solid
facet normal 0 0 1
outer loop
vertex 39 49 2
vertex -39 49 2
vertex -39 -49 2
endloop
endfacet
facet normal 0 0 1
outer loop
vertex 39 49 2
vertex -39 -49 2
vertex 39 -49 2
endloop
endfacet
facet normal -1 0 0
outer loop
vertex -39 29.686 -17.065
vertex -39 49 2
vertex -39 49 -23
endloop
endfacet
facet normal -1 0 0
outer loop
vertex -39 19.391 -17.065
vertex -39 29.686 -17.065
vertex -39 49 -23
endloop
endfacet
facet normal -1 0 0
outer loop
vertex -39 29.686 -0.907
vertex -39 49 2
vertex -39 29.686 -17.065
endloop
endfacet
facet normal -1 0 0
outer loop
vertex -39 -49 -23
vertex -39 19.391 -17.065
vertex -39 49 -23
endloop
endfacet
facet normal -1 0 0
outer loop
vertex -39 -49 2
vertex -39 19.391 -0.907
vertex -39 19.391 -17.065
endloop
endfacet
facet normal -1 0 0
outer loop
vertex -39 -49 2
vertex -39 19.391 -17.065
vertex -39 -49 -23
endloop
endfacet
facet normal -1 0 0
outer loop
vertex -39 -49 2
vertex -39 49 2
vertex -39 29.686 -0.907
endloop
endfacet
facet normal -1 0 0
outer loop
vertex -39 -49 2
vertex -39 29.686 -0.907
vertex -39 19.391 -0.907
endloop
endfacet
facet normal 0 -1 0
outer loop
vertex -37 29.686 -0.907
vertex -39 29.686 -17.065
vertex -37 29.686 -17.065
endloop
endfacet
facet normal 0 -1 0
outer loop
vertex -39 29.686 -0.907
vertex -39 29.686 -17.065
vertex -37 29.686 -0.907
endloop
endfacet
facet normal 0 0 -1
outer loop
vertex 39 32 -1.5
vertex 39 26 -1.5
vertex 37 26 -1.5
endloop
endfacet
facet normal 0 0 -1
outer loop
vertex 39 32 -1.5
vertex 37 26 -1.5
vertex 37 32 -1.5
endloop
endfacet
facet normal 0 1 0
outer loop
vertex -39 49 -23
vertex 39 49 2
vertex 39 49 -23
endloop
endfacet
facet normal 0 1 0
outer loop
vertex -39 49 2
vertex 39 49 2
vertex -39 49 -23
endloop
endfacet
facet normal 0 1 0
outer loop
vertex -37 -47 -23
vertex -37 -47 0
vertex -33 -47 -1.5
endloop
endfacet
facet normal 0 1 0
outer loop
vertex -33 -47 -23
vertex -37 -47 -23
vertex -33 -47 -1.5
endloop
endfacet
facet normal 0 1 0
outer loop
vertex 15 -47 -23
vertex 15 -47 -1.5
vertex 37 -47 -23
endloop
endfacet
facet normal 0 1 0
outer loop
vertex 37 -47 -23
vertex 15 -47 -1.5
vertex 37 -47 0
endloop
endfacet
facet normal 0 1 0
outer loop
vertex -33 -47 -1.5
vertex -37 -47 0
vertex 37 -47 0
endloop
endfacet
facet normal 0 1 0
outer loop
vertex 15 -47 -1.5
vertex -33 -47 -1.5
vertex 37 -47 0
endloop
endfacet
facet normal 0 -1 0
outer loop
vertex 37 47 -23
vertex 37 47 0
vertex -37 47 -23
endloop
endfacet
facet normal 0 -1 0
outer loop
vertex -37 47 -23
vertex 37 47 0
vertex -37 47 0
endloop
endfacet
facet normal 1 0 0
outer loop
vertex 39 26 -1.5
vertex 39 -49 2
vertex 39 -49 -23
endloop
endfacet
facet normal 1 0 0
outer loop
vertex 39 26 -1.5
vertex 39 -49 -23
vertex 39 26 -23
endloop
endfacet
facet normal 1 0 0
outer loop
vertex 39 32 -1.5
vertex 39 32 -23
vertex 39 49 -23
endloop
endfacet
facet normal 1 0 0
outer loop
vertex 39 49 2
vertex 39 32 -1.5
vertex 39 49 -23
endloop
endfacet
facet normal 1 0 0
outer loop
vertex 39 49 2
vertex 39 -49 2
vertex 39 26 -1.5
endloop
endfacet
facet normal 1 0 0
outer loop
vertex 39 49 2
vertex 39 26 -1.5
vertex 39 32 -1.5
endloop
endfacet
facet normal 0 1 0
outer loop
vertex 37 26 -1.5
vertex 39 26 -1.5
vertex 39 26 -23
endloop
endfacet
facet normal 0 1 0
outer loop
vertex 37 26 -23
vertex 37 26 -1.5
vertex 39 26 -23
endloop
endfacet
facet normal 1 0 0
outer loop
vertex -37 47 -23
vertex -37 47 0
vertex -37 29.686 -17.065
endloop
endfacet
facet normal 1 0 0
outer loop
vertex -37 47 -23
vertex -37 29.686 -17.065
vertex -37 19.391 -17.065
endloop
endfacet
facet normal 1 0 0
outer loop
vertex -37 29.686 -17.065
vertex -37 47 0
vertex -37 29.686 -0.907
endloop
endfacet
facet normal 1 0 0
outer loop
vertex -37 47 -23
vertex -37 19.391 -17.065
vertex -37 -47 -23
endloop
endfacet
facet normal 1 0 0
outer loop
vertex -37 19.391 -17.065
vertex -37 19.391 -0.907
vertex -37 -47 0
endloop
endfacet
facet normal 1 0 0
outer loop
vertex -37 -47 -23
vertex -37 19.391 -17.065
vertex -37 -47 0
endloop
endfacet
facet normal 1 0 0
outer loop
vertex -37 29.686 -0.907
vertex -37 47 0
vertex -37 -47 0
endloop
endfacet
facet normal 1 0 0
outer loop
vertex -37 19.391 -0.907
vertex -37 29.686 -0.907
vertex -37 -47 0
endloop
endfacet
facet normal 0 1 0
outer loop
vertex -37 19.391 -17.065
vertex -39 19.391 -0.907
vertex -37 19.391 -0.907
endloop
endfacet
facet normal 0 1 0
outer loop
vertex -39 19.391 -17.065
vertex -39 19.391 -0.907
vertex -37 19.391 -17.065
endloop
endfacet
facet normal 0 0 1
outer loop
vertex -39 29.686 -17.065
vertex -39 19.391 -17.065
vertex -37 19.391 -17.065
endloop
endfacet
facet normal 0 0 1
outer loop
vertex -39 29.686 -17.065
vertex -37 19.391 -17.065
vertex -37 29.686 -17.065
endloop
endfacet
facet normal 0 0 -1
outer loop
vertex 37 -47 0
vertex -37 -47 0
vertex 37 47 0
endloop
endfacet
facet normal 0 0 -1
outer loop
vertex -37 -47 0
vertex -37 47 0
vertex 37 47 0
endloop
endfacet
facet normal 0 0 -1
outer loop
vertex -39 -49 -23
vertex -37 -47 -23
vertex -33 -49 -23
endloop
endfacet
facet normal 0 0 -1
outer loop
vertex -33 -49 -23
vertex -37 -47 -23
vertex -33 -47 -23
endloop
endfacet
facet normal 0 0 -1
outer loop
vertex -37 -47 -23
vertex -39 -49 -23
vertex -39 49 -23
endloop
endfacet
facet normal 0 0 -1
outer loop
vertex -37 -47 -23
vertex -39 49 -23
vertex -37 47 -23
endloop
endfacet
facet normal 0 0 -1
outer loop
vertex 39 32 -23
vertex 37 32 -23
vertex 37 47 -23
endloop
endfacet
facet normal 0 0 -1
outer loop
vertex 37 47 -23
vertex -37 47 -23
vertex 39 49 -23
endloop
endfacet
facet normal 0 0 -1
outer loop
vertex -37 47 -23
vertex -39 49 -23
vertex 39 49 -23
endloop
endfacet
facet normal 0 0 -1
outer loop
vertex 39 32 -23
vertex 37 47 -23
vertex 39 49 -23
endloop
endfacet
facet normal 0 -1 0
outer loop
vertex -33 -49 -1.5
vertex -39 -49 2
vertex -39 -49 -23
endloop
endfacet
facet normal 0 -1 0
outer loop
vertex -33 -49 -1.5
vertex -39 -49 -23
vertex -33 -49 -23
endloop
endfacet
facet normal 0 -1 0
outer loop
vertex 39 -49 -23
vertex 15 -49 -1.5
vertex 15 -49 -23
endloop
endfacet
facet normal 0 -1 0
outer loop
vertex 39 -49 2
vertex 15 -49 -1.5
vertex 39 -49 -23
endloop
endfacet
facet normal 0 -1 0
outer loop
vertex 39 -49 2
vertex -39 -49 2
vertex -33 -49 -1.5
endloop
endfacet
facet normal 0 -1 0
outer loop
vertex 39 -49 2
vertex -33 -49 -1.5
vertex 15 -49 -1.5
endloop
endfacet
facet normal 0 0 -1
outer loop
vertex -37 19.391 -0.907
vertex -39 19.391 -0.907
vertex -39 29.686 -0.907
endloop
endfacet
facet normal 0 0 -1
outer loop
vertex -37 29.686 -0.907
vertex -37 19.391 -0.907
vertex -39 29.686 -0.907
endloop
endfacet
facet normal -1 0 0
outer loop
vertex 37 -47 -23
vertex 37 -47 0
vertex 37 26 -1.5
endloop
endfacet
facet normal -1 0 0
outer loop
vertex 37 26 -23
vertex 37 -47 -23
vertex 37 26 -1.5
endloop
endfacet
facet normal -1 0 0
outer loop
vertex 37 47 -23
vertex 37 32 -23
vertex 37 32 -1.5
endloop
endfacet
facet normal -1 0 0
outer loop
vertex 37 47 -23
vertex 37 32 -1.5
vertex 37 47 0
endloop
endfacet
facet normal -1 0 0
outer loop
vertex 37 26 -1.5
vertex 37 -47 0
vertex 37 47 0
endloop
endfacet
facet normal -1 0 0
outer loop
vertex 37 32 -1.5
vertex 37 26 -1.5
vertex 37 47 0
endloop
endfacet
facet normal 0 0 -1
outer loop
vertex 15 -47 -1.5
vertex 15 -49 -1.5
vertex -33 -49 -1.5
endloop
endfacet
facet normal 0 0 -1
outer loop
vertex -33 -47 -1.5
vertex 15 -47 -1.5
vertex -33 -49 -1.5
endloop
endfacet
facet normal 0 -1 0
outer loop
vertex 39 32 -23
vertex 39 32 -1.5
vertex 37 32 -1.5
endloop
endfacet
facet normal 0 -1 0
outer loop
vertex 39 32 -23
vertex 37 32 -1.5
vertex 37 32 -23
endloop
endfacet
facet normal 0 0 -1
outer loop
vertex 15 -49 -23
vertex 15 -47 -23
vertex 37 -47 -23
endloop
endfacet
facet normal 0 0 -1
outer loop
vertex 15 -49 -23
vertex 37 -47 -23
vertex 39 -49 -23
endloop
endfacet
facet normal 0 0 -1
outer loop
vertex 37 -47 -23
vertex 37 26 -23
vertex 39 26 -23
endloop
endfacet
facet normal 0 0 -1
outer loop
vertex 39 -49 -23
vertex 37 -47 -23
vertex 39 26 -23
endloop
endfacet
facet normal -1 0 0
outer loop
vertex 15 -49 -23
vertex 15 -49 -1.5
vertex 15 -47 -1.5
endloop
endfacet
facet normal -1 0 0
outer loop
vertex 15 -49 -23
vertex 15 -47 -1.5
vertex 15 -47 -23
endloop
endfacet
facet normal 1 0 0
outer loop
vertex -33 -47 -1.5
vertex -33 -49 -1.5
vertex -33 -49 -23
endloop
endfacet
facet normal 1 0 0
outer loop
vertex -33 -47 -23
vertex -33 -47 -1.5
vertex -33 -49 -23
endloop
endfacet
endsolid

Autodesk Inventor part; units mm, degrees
ref_plane "YZ Plane" through (0, 0, 0) normal (1, 0, 0) x (0, 1, 0)
ref_plane "XZ Plane" through (0, 0, 0) normal (0, 1, 0) x (-1, 0, 0)
ref_plane "XY Plane" through (0, 0, 0) normal (0, 0, 1) x (1, 0, 0)
sketch "Эскиз1" plane through (0, 0, 0) normal (0, 0, 1) x (1, 0, 0)
  line L0 (-37, -47) -> (37, -47)
  line L1 (37, -47) -> (37, 47)
  line L2 (37, 47) -> (-37, 47)
  line L3 (-37, 47) -> (-37, -47)
  line L4 (-35, -44) -> (-35, 44) projected
  line L5 (34, -45) -> (-34, -45) projected
  line L6 (35, 44) -> (35, -44) projected
  line L7 (-34, 45) -> (34, 45) projected
  point P0 (0, 0)
  dimension "d0" = 2
  dimension "d1" = 2
  dimension "d2" = 2
  dimension "d3" = 2
extrude "Выдавливание1" add sketch "Эскиз1" along normal blind 2
sketch "Эскиз2" plane through (0, 0, 2) normal (0, 0, 1) x (1, 0, 0)
  line L0 (-39, -49) -> (39, -49)
  line L1 (39, -49) -> (39, 49)
  line L2 (39, 49) -> (-39, 49)
  line L3 (-39, 49) -> (-39, -49)
  line L4 (-37, 47) -> (-37, -47) projected
  line L5 (-37, -47) -> (37, -47) projected
  line L6 (37, -47) -> (37, 47) projected
  line L7 (37, 47) -> (-37, 47) projected
  point P0 (0, 0)
  dimension "d6" = 2
  dimension "d7" = 2
  dimension "d8" = 2
  dimension "d9" = 2
extrude "Выдавливание2" add sketch "Эскиз2" against normal blind 25
sketch "Эскиз3" plane through (-39, -49, 2) normal (-1, 0, 0) x (0, 0, 1)
  line L0 (-3.5, 69) -> (-3.5, 78) projected
  line L1 (-3.5, 69) -> (-14.5, 69) projected
  line L2 (-14.5, 78) -> (-14.5, 69) projected
  line L3 (-3.5, 78) -> (-14.5, 78) projected
  point P0 (-2, 49)
extrude "Выдавливание3" cut sketch "Эскиз3" against normal blind 25
sketch "Эскиз4" plane through (-39, -49, 2) normal (-1, 0, 0) x (0, 0, 1)
  line L0 (-3.5, 69) -> (-3.5, 78) projected
  line L1 (-3.5, 78) -> (-14.5, 78) projected
  line L2 (-14.5, 69) -> (-14.5, 78) projected
  line L3 (-3.5, 69) -> (-14.5, 69) projected
  line L4 (-15.0649, 68.3908) -> (-2.9071, 68.3908)
  line L5 (-2.9071, 68.3908) -> (-2.9071, 78.6857)
  line L6 (-2.9071, 78.6857) -> (-15.0649, 78.6857)
  line L7 (-15.0649, 78.6857) -> (-15.0649, 68.3908)
  point P0 (-2, 49)
extrude "Выдавливание4" cut sketch "Эскиз4" against normal blind 25
sketch "Эскиз5" plane through (-39, -49, 2) normal (0, -1, 0) x (1, 0, 0)
  line L0 (19, -3.5) -> (6, -3.5) projected
  line L1 (19, -3.5) -> (19, -19.5) projected
  line L2 (6, -19.5) -> (19, -19.5) projected
  line L3 (6, -3.5) -> (6, -19.5) projected
  line L4 (65, -3.5) -> (38, -3.5) projected
  line L5 (65, -3.5) -> (65, -9.5) projected
  line L6 (54, -9.5) -> (65, -9.5) projected
  line L7 (54, -9.5) -> (54, -16.5) projected
  line L8 (38, -16.5) -> (54, -16.5) projected
  line L9 (38, -3.5) -> (38, -16.5) projected
  line L10 (2, -25) -> (76, -25) projected
  line L11 (6, -3.5) -> (54, -3.5)
  line L12 (54, -3.5) -> (54, -25)
  line L13 (54, -25) -> (6, -25)
  line L14 (6, -25) -> (6, -3.5)
  line L15 (54, -25) -> (6, -25)
  line L16 (6, -25) -> (6, -2.7247)
  line L17 (6, -2.7247) -> (54, -2.7247)
  line L18 (54, -2.7247) -> (54, -25)
  point P0 (39, -2)
  point P1 (6, -25)
extrude "Выдавливание5" cut sketch "Эскиз5" against normal blind 25 contours L1 L2 L3 L0 | L11 L9 L8 L12 L10 L14 L2 L1 | L4 L12 L7 L8 L9
sketch "Эскиз6" plane through (39, -49, 2) normal (1, 0, 0) x (0, 0, -1)
  arc A0 (8.5, 75) -> (8.5, 81) centre (8.5, 78) ccw projected
  arc A1 (6.5, 81) -> (6.5, 75) centre (6.5, 78) ccw projected
  line L0 (6.5, 75) -> (8.5, 75) projected
  arc A2 (8.5, 75) -> (8.5, 81) centre (8.5, 78) ccw projected
  line L1 (6.5, 81) -> (8.5, 81) projected
  line L2 (25, 0) -> (25, 98) projected
  line L3 (3.5, 81) -> (25, 81)
  line L4 (25, 81) -> (25, 75)
  line L5 (25, 75) -> (3.5, 75)
  line L6 (3.5, 75) -> (3.5, 81)
  point P0 (2, 49)
  point P1 (6.5, 75)
  point P2 (8.5, 75)
  point P3 (8.5, 81)
  point P4 (6.5, 81)
extrude "Выдавливание6" cut sketch "Эскиз6" against normal blind 25
sketch "Эскиз7" plane through (-39, -49, 2) normal (-1, 0, 0) x (0, 0, 1)
  point P0 (-2, 49)
sketch "Эскиз8" plane through (-39, -49, 2) normal (-1, 0, 0) x (0, 0, 1)
  line L0 (-15.0649, 68.3908) -> (-15.0649, 78.6857) projected
  line L1 (-15.0649, 78.6857) -> (-15.0649, 68.3908) projected
  line L2 (-15.0649, 68.3908) -> (-19.0649, 68.3908)
  line L3 (-19.0649, 68.3908) -> (-19.0649, 78.6857)
  line L4 (-19.0649, 78.6857) -> (-15.0649, 78.6857)
  line L5 (-15.0649, 78.6857) -> (-15.0649, 68.3908)
  point P0 (-2, 49)
  dimension "d20" = 4
extrude "Выдавливание7" cut sketch "Эскиз8" against normal blind 10
equation "\"d7\" = d6"
equation "\"d8\" = d7"
equation "\"d9\" = d7"
properties part number "btn"
